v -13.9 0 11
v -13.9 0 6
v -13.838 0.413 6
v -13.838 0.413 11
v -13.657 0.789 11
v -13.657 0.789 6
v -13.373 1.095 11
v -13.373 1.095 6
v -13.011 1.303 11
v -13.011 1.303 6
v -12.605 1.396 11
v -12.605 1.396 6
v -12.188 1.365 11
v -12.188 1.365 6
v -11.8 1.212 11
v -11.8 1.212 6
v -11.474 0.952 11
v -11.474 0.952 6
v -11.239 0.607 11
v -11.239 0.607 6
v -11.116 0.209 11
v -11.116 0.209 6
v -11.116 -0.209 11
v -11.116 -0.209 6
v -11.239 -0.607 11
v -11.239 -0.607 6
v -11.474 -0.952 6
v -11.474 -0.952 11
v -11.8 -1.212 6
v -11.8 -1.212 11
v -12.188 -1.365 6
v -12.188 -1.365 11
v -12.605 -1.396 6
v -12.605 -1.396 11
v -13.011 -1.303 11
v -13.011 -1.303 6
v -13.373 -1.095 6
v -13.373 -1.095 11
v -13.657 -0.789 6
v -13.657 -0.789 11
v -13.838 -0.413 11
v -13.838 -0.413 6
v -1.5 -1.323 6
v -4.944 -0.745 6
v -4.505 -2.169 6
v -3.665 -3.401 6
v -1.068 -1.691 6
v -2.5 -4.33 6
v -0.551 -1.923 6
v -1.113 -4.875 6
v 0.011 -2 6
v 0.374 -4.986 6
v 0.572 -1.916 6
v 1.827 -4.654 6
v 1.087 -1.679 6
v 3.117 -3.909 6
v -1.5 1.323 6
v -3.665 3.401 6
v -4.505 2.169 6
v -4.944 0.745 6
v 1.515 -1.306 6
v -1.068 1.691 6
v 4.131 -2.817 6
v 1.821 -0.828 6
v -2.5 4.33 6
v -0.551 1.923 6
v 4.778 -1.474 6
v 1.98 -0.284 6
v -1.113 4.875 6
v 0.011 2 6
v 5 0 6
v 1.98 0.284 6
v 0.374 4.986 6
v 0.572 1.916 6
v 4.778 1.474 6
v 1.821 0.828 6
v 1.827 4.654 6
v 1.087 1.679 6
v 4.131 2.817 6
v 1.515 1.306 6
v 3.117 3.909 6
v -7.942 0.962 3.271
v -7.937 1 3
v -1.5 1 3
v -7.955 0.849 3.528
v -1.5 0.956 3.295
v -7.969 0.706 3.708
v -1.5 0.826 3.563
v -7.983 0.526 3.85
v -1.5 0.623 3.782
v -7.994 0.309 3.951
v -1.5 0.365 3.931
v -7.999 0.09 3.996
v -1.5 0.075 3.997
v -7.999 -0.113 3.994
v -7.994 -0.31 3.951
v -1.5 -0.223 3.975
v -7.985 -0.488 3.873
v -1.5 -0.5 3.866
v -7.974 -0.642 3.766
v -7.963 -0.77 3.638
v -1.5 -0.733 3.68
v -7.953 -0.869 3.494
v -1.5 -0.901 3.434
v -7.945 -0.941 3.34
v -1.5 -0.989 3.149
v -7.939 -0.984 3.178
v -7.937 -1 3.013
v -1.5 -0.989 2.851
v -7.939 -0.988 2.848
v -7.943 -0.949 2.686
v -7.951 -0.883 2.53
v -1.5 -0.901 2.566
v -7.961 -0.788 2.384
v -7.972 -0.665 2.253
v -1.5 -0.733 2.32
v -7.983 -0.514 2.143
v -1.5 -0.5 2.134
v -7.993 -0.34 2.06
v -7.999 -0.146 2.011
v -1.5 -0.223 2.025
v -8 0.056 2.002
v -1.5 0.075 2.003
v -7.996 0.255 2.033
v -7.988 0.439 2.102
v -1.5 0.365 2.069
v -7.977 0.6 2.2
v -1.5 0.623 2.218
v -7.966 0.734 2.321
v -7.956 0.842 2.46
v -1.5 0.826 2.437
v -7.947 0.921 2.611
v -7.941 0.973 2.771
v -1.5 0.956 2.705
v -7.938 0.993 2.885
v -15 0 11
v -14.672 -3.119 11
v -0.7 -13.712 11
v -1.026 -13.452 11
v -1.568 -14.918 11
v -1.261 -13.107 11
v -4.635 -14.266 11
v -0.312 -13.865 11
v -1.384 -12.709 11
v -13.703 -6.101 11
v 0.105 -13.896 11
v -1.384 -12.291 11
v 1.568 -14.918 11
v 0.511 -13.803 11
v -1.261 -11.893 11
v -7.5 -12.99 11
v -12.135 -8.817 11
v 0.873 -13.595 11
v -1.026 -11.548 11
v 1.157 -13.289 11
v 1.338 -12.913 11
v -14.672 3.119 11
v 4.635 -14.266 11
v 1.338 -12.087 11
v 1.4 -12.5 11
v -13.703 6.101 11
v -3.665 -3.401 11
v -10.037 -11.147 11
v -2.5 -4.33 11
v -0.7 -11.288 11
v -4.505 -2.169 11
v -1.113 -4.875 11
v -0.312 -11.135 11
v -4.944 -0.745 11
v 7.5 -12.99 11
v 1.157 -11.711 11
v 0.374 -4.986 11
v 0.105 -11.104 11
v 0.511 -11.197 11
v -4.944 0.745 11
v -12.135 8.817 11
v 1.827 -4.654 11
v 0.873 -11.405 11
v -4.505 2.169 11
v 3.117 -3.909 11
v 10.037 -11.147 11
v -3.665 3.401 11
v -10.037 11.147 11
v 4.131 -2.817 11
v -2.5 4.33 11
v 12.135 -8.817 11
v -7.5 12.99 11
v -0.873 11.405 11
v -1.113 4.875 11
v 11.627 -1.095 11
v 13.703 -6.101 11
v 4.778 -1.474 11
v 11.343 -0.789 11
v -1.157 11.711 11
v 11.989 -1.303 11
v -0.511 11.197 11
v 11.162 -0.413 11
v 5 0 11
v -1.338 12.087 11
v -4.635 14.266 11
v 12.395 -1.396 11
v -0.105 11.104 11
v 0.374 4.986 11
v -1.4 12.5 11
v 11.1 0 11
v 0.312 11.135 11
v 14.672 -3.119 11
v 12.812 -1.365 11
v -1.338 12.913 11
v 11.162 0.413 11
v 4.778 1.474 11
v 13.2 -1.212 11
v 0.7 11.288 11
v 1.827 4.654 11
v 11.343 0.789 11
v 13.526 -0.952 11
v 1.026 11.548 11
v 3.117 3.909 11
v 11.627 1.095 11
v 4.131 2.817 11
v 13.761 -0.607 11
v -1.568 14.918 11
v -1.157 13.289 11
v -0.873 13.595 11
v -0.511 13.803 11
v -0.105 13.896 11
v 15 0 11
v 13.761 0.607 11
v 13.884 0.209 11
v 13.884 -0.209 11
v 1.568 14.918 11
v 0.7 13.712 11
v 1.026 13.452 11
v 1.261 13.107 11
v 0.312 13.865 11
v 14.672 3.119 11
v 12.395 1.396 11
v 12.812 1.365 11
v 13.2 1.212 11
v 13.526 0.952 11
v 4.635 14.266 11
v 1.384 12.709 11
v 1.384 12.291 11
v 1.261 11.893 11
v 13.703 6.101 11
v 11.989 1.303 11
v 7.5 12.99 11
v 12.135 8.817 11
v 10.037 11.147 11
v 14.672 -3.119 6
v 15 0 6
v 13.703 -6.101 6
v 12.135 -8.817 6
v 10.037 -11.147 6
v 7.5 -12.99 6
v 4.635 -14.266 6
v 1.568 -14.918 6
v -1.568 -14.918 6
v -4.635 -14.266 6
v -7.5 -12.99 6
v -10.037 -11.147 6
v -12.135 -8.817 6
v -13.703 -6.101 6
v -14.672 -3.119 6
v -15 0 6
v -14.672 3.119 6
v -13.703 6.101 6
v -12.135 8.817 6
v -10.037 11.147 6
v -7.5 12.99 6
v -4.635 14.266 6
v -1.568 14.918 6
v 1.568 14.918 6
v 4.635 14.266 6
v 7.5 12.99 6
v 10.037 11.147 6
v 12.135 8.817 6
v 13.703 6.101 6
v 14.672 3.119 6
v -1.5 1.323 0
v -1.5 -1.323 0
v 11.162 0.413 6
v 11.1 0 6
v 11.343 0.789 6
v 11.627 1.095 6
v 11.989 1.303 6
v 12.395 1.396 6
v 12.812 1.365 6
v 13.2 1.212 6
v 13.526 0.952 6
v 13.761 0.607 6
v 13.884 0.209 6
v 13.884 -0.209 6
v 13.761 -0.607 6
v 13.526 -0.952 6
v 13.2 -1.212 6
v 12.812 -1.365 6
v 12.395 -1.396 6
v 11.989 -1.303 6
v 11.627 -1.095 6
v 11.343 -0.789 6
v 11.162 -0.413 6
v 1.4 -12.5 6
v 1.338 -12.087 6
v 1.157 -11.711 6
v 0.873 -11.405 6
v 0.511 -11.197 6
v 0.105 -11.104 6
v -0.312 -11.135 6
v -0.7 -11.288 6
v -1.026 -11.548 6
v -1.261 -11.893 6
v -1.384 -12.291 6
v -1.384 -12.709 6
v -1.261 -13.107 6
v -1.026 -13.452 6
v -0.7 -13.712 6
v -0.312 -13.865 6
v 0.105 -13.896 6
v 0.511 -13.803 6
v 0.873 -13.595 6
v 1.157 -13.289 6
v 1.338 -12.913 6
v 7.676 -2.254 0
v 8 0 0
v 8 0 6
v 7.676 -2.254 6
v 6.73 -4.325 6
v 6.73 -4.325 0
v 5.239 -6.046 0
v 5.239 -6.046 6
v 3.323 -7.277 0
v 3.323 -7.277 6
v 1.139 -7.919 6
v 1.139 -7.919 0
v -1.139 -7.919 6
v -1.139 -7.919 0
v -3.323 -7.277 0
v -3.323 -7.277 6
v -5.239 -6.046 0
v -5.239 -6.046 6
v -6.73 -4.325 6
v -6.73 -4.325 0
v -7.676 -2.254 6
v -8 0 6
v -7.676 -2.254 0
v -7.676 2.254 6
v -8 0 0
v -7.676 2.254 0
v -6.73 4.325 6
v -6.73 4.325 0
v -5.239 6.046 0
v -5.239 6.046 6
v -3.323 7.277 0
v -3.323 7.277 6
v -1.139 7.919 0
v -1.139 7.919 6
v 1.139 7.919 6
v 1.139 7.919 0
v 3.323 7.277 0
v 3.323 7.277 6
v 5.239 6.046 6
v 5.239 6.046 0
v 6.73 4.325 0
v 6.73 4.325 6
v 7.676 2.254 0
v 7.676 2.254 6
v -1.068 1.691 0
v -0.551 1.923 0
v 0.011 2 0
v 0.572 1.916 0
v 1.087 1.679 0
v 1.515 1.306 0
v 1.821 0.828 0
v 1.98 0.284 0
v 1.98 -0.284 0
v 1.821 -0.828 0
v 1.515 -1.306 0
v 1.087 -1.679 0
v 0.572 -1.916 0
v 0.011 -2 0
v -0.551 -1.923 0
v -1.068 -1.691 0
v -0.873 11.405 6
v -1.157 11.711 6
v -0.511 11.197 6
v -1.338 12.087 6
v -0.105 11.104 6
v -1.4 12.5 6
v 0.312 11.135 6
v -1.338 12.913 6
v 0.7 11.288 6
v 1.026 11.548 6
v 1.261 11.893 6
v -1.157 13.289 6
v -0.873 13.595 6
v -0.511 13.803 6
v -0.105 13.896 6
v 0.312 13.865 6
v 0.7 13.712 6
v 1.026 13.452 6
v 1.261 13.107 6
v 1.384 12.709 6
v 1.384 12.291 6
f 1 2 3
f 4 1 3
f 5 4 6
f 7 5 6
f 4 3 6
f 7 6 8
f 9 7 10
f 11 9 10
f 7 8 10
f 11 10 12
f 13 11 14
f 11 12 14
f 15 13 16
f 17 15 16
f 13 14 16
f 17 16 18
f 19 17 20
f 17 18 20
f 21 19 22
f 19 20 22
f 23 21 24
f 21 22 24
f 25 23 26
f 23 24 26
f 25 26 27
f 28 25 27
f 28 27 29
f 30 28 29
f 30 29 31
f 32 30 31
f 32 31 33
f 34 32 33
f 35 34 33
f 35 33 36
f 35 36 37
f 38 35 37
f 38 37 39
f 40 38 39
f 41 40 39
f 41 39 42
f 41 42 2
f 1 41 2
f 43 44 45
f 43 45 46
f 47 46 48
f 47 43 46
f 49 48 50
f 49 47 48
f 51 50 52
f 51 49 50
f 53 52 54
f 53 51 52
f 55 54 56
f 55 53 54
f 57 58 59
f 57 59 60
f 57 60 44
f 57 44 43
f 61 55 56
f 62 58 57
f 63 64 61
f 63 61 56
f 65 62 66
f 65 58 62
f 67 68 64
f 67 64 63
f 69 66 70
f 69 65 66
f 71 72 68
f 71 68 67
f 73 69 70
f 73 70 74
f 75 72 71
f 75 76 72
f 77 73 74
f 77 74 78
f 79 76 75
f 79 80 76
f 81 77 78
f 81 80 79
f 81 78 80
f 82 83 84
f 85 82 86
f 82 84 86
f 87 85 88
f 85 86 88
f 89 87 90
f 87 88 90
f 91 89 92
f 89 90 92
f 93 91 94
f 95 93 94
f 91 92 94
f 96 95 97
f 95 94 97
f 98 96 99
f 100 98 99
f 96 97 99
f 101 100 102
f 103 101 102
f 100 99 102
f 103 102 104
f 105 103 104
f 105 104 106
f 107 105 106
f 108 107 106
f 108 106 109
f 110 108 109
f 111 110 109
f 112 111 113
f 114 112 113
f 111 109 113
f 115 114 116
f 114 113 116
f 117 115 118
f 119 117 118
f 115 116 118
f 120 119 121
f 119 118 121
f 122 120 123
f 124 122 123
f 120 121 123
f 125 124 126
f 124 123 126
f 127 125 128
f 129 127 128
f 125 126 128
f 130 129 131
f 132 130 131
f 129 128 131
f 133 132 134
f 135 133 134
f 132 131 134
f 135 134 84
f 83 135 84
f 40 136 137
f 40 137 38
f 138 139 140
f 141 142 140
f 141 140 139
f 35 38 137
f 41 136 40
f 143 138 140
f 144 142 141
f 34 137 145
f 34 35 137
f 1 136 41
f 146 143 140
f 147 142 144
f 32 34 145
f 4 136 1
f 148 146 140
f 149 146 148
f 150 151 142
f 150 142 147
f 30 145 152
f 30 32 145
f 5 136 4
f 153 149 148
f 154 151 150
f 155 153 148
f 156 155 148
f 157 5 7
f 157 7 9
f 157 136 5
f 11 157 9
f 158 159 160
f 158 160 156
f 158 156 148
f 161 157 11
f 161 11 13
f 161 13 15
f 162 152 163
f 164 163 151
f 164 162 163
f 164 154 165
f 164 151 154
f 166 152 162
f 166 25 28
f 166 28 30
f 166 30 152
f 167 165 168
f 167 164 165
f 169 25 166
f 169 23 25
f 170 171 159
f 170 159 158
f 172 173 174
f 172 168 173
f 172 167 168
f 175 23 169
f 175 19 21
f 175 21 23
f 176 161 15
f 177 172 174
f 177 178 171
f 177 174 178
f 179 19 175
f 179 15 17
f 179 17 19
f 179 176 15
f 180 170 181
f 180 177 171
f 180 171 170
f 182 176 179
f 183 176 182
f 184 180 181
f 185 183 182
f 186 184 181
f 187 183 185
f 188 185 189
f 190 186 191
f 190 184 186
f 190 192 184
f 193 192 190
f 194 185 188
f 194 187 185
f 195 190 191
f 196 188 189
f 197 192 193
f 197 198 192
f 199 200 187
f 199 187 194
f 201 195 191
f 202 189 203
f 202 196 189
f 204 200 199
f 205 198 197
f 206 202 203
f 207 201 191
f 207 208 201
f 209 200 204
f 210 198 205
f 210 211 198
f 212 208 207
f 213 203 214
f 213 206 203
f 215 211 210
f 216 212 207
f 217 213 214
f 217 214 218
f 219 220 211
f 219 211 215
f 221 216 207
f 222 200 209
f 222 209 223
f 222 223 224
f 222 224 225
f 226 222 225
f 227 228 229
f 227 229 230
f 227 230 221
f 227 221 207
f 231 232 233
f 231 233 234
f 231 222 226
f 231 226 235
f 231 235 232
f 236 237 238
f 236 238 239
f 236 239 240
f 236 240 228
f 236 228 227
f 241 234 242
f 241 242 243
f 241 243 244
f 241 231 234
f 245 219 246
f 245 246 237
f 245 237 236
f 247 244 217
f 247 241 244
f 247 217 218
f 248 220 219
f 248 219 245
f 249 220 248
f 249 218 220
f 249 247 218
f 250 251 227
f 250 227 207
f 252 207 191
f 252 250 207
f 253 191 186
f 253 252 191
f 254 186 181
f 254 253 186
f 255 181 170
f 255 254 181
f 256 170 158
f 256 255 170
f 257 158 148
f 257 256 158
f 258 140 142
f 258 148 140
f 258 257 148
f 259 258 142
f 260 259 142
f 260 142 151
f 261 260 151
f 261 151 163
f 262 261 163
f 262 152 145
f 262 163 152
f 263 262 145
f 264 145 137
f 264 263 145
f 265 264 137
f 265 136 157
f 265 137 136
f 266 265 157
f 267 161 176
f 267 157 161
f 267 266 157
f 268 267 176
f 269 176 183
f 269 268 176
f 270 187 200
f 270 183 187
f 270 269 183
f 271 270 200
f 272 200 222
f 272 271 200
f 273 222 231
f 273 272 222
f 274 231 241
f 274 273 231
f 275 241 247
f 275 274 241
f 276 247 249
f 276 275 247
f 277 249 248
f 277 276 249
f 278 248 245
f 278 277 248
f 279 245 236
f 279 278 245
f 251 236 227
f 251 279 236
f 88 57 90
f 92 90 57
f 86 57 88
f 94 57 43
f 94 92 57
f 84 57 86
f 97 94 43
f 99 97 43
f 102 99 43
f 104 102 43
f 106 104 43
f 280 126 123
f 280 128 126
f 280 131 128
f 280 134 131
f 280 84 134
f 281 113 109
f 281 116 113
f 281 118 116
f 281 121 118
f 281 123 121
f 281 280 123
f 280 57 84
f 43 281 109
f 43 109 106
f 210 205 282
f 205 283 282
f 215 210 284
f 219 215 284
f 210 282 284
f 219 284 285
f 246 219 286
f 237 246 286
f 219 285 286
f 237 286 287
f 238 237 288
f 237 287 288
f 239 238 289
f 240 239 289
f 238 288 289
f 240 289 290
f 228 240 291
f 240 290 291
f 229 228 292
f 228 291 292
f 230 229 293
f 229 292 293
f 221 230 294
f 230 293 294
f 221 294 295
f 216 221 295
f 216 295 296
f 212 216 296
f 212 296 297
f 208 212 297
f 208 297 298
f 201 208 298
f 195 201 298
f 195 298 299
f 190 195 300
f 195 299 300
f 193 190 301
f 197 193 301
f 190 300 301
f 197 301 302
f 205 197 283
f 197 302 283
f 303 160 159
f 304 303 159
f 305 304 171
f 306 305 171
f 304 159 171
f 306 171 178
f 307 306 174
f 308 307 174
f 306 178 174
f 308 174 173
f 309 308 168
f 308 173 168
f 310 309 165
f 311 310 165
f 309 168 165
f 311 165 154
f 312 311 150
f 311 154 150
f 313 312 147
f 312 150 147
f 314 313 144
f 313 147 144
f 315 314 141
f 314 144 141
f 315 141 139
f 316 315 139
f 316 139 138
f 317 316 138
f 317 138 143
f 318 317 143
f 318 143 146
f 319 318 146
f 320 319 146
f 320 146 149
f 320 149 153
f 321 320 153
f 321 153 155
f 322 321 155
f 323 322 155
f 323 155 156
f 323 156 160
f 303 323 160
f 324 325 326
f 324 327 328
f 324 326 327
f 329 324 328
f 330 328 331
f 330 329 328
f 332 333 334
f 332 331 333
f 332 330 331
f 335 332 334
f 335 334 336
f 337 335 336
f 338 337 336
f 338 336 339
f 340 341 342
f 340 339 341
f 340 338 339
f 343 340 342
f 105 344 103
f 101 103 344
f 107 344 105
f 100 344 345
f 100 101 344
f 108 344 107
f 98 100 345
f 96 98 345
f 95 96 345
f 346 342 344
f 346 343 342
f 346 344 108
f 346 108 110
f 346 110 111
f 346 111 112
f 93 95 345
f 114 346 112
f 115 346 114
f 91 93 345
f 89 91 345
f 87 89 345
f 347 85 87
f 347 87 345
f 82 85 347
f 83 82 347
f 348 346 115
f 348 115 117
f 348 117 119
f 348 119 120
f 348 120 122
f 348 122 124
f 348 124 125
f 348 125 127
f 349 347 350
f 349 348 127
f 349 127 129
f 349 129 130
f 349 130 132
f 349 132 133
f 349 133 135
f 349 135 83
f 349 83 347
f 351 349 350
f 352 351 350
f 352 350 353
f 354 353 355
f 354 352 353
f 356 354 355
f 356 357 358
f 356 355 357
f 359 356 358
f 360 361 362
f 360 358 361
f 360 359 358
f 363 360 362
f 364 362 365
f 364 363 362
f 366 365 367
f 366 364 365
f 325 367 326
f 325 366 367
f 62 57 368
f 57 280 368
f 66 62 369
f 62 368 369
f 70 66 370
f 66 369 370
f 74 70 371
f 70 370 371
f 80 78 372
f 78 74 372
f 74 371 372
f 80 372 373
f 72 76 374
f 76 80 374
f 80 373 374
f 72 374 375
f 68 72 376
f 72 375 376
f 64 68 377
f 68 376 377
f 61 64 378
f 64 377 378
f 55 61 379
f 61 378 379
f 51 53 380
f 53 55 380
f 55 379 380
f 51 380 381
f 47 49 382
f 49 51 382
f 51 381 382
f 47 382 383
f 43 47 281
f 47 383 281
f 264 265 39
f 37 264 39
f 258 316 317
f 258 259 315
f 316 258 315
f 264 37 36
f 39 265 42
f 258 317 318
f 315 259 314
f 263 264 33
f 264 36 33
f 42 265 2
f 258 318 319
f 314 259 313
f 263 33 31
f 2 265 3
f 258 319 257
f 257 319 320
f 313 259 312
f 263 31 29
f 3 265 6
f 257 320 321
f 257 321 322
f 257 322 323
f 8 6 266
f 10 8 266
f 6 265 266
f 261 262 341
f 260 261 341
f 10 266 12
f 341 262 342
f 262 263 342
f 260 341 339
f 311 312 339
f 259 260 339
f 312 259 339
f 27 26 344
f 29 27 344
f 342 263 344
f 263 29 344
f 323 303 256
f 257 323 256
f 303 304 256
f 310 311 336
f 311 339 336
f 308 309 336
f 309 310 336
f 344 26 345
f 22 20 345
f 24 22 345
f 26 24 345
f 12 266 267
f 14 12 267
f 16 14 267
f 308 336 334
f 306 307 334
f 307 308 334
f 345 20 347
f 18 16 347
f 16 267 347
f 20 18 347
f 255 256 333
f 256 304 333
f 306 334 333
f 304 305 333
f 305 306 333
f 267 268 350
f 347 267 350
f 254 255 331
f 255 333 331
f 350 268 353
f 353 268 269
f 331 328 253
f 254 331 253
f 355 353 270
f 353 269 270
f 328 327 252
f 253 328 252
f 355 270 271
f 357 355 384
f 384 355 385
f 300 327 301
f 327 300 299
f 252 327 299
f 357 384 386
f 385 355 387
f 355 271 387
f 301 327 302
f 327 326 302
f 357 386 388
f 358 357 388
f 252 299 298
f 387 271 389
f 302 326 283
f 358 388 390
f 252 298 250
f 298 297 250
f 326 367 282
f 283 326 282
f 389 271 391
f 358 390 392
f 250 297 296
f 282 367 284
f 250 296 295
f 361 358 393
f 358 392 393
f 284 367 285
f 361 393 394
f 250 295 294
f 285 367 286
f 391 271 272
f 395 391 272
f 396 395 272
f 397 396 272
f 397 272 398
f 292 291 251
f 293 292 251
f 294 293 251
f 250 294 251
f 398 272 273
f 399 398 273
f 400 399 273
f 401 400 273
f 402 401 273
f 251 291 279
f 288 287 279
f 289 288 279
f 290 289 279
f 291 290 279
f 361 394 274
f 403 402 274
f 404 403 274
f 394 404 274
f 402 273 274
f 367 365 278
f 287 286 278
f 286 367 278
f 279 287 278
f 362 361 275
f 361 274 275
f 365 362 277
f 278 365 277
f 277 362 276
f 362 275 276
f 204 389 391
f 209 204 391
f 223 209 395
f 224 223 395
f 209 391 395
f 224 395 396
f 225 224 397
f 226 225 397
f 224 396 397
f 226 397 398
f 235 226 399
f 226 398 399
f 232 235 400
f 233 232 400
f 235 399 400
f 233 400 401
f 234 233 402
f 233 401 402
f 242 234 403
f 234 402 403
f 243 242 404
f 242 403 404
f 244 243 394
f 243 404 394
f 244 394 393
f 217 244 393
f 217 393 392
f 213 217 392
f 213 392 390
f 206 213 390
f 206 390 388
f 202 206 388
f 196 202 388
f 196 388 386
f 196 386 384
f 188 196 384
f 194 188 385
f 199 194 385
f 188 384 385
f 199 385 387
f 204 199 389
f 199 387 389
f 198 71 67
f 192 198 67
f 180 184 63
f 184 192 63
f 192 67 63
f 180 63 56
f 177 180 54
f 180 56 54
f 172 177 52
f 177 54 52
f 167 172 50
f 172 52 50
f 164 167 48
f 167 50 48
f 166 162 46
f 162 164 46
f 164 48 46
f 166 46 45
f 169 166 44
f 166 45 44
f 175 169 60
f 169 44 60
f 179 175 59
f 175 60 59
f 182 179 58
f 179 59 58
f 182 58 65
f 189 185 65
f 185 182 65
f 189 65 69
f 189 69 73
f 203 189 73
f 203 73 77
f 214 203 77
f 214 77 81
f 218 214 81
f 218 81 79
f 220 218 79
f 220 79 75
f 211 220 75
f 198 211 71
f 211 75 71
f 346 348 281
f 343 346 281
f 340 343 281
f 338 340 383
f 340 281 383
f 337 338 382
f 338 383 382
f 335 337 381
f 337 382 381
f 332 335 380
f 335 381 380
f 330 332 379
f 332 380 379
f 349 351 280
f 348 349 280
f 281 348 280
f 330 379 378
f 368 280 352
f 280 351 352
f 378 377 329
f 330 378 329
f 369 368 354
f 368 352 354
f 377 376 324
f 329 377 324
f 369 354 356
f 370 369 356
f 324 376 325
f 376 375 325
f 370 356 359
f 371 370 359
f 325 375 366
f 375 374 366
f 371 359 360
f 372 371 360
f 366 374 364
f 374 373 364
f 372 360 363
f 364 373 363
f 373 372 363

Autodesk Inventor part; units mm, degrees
ref_plane "YZ Plane" through (0, 0, 0) normal (1, 0, 0) x (0, 1, 0)
ref_plane "XZ Plane" through (0, 0, 0) normal (0, 1, 0) x (-1, 0, 0)
ref_plane "XY Plane" through (0, 0, 0) normal (0, 0, 1) x (1, 0, 0)
sketch "Sketch1" plane through (0, 0, 0) normal (0, 0, 1) x (1, 0, 0)
  circle A0 centre (0, 0) radius 2
  circle A1 centre (0, 0) radius 8
  dimension "d0" = 4
  dimension "d1" = 16
extrude "Extrusion1" add sketch "Sketch1" along normal blind 6
sketch "Sketch2" plane through (0, 0, 6) normal (0, 0, 1) x (1, 0, 0)
  circle A0 centre (0, 0) radius 5
  circle A1 centre (0, 0) radius 15
  dimension "d4" = 10
  dimension "d5" = 30
extrude "Extrusion2" add sketch "Sketch2" along normal blind 5
sketch "Sketch5" plane through (0, 0, 6) normal (0, 0, -1) x (-1, 0, 0)
  circle A0 centre (0, 12.5) radius 1.4
  circle A1 centre (-12.5, 0) radius 1.4
  circle A2 centre (0, -12.5) radius 1.4
  circle A3 centre (12.5, 0) radius 1.4
  point P0 (0, 0)
  dimension "d24" = 12.5
  dimension "d25" = 2.8
  dimension "d28" = 360
extrude "Extrusion5" cut sketch "Sketch5" against normal blind 10 contours A0 | A1 | A3
sketch "Sketch6" plane through (0, 0, 11) normal (0, 0, 1) x (1, 0, 0)
  circle A0 centre (0, -12.5) radius 1.4
  point P0 (0, 0)
  dimension "d42" = 2.8
  dimension "d43" = 12.5
extrude "Extrusion6" cut sketch "Sketch6" against normal blind 10
sketch "Sketch9" plane through (0, 0, 0) normal (0, 0, -1) x (-1, 0, 0)
  line L0 (1.5, 2.0687) -> (1.5, -2.0687)
  circle A0 centre (0, 0) radius 2
  point P0 (1.5, 1.3229)
  point P1 (1.5, -1.3229)
  dimension "d46" = 4
  dimension "d47" = 1.5
extrude "Extrusion7" add sketch "Sketch9" against normal blind 6 contours A0 L0 picked at (1.7382, -0.2911)
sketch "Sketch11" plane through (0, 0, 0) normal (1, 0, 0) x (0, 1, 0)
  circle A0 centre (0, 3) radius 1
  line L0 (8, 0) -> (-8, 0) projected
  point P0 (0, 0)
  dimension "d50" = 2
  dimension "d51" = 3
extrude "Extrusion8" cut sketch "Sketch11" against normal blind 10
sketch "Sketch12" plane through (0, 0, 6) normal (0, 0, -1) x (-1, 0, 0)
  point P0 (0, 0)
sketch "Sketch13" plane through (0, 0, 6) normal (0, 0, -1) x (-1, 0, 0)
  point P0 (0, 0)
properties part number "motor dişlisi"
